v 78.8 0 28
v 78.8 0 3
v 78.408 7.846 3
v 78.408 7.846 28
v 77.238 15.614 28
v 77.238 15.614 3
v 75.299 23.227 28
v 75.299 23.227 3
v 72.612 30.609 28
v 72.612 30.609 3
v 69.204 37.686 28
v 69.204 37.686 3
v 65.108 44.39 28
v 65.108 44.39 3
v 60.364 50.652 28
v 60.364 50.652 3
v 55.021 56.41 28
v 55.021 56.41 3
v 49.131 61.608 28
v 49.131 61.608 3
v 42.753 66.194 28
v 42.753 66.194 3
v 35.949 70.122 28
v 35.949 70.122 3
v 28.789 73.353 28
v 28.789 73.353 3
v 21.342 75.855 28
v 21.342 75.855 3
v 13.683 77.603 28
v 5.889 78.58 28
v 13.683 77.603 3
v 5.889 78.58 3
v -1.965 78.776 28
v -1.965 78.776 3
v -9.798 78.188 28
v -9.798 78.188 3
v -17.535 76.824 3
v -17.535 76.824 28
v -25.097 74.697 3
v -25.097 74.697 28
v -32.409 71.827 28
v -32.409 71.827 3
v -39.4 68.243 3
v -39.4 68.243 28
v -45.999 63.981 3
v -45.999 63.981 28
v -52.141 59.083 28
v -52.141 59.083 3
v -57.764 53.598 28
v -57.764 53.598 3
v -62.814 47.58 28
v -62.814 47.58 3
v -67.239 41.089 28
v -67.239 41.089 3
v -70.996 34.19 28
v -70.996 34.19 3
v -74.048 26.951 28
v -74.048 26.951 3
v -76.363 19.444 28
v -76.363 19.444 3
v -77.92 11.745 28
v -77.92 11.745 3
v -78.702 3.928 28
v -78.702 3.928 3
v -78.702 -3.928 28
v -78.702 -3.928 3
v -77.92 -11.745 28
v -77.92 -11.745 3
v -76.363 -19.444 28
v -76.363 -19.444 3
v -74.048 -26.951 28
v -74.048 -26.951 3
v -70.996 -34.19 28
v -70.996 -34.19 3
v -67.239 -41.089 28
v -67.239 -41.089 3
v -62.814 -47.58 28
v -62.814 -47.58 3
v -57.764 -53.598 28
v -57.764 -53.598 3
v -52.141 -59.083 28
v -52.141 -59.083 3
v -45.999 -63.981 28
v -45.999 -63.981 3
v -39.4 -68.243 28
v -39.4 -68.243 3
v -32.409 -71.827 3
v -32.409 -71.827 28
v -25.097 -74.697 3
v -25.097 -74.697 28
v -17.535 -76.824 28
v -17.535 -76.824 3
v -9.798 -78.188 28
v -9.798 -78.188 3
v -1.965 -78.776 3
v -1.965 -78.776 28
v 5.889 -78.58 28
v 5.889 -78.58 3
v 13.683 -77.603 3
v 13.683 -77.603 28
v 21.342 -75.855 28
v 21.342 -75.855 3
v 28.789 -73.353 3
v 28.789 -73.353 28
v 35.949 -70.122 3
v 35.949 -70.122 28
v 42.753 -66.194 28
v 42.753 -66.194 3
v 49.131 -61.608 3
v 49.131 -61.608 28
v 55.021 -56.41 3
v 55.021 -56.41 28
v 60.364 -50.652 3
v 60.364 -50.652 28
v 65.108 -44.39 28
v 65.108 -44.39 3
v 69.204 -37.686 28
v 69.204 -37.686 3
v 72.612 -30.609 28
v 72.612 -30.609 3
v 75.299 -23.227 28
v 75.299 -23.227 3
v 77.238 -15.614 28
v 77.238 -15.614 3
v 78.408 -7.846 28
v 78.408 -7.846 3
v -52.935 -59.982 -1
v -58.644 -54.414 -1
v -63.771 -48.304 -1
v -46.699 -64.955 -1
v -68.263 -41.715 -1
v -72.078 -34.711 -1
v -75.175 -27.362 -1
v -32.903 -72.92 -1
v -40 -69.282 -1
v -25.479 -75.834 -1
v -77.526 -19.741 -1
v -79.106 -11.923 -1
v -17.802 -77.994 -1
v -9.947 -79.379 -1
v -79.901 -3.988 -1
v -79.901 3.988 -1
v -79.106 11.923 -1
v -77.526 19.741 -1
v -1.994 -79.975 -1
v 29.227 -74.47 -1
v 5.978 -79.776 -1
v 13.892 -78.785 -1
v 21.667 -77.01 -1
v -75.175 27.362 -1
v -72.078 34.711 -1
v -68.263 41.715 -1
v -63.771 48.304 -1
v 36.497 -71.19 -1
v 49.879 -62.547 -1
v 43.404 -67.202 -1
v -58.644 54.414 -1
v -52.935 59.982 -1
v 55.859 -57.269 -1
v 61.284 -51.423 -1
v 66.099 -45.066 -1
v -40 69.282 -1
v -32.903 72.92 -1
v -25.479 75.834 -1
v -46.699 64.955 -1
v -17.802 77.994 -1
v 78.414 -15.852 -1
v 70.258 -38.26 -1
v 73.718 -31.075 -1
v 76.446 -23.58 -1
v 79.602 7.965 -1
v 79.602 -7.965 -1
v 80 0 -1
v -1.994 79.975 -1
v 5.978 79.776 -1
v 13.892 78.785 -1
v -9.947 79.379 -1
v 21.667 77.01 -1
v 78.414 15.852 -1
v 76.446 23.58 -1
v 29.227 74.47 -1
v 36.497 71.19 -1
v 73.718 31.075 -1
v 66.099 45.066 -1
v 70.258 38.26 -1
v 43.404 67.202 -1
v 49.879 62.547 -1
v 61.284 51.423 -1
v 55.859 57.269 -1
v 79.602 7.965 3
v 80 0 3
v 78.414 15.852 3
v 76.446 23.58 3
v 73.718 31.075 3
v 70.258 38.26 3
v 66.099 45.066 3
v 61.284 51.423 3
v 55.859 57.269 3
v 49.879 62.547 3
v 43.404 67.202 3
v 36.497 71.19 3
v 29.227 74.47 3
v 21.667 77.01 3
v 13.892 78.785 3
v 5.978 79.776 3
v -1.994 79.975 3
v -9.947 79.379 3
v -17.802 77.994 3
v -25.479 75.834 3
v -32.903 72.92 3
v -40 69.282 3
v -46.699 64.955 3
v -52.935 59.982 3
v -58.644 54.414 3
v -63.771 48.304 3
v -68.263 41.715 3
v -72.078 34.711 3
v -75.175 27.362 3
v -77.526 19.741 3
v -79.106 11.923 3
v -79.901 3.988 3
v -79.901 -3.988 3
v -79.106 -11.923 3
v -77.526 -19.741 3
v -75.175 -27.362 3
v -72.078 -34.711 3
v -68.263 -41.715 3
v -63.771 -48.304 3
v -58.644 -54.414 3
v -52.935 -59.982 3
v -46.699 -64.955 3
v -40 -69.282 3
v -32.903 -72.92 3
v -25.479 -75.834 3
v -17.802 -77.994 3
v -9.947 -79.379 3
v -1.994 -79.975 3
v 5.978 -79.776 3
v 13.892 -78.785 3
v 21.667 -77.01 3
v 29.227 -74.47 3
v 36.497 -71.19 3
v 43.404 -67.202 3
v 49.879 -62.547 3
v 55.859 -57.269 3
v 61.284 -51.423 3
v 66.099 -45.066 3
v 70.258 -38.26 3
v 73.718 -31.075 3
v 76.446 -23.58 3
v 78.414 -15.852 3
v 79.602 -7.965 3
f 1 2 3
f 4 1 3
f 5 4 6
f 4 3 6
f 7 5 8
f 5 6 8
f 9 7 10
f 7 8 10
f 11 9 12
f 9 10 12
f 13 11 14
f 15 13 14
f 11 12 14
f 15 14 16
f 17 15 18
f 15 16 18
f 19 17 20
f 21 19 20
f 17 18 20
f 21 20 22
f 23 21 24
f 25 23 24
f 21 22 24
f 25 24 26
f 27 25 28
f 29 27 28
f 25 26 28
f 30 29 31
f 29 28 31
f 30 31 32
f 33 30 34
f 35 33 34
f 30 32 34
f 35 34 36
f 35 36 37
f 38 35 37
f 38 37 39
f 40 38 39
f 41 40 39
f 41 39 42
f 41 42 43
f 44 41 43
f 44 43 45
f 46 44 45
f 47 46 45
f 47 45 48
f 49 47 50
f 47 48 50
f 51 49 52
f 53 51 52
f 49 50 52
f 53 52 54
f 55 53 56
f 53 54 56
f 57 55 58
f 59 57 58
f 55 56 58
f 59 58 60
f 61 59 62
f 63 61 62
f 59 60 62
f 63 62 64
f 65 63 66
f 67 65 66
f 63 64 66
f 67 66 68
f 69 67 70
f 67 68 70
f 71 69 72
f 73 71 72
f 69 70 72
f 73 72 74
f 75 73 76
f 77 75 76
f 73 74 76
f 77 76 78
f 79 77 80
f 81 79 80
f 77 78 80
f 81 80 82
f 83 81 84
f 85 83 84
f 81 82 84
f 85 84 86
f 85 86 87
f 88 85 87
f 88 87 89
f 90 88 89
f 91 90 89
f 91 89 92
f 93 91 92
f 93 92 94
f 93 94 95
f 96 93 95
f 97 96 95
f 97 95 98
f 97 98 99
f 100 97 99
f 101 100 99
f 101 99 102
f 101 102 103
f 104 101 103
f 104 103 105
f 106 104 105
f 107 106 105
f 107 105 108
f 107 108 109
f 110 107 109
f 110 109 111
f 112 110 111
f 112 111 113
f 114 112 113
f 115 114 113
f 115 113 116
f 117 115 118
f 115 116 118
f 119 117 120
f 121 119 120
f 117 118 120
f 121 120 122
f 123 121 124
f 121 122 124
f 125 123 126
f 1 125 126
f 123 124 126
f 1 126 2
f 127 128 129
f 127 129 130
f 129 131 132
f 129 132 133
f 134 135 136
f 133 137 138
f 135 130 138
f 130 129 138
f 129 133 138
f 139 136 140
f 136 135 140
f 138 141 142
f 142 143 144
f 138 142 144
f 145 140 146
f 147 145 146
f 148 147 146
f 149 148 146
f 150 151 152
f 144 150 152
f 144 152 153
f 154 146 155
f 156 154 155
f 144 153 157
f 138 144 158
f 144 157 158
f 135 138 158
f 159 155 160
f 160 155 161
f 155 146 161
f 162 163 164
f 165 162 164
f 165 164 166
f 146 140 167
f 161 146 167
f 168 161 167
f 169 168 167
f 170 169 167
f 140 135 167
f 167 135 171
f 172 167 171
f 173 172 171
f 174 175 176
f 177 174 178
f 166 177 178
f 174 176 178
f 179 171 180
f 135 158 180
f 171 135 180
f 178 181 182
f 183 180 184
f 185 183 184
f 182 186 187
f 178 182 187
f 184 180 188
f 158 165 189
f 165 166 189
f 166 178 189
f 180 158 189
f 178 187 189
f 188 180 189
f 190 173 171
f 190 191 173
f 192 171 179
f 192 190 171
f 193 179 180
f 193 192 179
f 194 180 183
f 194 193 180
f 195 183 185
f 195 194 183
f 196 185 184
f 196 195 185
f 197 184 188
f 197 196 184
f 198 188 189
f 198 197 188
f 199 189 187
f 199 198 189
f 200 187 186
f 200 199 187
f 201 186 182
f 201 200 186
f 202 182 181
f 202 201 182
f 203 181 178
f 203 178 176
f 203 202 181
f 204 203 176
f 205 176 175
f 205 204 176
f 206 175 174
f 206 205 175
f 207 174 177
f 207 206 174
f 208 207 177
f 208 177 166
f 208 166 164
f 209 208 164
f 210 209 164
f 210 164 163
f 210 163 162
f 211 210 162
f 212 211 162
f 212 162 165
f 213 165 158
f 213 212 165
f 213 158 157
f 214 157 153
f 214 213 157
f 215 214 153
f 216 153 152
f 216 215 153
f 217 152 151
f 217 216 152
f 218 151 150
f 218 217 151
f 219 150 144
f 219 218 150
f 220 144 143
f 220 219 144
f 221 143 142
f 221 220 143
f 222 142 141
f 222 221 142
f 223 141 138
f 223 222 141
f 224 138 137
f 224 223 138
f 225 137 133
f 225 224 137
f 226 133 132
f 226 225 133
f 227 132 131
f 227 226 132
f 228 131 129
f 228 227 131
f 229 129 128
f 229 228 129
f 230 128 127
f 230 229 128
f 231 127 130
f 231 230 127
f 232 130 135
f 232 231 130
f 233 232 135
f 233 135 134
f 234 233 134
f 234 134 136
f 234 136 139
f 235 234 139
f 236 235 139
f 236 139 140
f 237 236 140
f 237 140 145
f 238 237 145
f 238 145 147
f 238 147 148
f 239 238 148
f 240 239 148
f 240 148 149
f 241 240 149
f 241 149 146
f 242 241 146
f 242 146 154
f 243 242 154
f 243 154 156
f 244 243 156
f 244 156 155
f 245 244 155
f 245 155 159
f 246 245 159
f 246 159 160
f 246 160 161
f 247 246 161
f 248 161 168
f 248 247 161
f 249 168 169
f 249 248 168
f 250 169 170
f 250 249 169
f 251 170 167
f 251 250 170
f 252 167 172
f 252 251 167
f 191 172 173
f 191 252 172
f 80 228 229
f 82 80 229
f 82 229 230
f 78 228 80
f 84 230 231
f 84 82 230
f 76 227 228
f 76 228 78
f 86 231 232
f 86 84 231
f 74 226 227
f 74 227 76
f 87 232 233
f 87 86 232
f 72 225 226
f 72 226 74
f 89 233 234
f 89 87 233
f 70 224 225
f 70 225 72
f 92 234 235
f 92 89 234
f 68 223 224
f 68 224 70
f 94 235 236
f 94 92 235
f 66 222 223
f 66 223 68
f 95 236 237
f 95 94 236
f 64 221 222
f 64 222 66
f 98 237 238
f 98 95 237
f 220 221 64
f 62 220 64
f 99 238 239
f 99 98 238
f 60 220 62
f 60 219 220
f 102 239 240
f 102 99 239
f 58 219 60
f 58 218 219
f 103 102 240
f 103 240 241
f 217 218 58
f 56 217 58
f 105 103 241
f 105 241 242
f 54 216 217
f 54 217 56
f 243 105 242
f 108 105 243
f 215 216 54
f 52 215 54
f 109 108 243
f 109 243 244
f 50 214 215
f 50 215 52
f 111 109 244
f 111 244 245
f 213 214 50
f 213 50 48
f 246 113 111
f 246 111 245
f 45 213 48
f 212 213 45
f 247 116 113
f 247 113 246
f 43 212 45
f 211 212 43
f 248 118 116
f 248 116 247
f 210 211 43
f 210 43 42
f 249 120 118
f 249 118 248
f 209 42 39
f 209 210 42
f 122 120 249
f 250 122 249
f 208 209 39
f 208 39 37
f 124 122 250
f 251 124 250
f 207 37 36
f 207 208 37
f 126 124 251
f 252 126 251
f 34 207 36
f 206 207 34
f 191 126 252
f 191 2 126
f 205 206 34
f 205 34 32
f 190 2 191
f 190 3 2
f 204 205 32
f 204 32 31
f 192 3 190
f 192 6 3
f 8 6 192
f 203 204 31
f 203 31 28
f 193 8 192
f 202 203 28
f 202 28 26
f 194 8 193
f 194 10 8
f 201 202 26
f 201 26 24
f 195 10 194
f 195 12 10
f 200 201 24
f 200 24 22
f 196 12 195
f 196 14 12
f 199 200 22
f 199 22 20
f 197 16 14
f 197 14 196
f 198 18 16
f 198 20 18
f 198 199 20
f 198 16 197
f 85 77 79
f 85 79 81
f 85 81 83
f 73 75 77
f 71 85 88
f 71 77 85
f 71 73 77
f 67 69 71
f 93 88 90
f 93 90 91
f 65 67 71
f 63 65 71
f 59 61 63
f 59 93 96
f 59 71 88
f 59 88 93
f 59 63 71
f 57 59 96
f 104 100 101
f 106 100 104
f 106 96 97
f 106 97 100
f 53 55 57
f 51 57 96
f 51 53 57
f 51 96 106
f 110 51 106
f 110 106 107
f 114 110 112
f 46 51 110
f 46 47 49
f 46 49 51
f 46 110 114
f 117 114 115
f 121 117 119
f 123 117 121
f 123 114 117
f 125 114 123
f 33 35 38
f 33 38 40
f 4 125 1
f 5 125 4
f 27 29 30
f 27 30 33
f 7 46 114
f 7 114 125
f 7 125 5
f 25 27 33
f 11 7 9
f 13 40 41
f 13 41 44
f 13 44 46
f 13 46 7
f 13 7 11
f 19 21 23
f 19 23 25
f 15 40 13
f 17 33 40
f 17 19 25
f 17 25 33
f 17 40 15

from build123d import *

# Parameters (mm, degrees)
F0_R     = 80
F1_DEPTH = 3
F2_R     = 78.8
F3_DEPTH = 25
F4_DEPTH = 1


with BuildPart() as f1:
    # F0 (on Top) → F1 (new body)
    with BuildSketch(Plane.XY):
        Circle(F0_R)
    extrude(amount=F1_DEPTH)

    # F2 (on face) → F3 (join)
    with BuildSketch(Plane.XY.offset(3)):
        Circle(F2_R)
    extrude(amount=F3_DEPTH)

    # F4 (add): a face of the model
    f4_faces = [f1.faces().sort_by_distance(p)[0] for p in [
        (0, 0, 0),
    ]]
    extrude(f4_faces, amount=F4_DEPTH)


solid = f1.part
